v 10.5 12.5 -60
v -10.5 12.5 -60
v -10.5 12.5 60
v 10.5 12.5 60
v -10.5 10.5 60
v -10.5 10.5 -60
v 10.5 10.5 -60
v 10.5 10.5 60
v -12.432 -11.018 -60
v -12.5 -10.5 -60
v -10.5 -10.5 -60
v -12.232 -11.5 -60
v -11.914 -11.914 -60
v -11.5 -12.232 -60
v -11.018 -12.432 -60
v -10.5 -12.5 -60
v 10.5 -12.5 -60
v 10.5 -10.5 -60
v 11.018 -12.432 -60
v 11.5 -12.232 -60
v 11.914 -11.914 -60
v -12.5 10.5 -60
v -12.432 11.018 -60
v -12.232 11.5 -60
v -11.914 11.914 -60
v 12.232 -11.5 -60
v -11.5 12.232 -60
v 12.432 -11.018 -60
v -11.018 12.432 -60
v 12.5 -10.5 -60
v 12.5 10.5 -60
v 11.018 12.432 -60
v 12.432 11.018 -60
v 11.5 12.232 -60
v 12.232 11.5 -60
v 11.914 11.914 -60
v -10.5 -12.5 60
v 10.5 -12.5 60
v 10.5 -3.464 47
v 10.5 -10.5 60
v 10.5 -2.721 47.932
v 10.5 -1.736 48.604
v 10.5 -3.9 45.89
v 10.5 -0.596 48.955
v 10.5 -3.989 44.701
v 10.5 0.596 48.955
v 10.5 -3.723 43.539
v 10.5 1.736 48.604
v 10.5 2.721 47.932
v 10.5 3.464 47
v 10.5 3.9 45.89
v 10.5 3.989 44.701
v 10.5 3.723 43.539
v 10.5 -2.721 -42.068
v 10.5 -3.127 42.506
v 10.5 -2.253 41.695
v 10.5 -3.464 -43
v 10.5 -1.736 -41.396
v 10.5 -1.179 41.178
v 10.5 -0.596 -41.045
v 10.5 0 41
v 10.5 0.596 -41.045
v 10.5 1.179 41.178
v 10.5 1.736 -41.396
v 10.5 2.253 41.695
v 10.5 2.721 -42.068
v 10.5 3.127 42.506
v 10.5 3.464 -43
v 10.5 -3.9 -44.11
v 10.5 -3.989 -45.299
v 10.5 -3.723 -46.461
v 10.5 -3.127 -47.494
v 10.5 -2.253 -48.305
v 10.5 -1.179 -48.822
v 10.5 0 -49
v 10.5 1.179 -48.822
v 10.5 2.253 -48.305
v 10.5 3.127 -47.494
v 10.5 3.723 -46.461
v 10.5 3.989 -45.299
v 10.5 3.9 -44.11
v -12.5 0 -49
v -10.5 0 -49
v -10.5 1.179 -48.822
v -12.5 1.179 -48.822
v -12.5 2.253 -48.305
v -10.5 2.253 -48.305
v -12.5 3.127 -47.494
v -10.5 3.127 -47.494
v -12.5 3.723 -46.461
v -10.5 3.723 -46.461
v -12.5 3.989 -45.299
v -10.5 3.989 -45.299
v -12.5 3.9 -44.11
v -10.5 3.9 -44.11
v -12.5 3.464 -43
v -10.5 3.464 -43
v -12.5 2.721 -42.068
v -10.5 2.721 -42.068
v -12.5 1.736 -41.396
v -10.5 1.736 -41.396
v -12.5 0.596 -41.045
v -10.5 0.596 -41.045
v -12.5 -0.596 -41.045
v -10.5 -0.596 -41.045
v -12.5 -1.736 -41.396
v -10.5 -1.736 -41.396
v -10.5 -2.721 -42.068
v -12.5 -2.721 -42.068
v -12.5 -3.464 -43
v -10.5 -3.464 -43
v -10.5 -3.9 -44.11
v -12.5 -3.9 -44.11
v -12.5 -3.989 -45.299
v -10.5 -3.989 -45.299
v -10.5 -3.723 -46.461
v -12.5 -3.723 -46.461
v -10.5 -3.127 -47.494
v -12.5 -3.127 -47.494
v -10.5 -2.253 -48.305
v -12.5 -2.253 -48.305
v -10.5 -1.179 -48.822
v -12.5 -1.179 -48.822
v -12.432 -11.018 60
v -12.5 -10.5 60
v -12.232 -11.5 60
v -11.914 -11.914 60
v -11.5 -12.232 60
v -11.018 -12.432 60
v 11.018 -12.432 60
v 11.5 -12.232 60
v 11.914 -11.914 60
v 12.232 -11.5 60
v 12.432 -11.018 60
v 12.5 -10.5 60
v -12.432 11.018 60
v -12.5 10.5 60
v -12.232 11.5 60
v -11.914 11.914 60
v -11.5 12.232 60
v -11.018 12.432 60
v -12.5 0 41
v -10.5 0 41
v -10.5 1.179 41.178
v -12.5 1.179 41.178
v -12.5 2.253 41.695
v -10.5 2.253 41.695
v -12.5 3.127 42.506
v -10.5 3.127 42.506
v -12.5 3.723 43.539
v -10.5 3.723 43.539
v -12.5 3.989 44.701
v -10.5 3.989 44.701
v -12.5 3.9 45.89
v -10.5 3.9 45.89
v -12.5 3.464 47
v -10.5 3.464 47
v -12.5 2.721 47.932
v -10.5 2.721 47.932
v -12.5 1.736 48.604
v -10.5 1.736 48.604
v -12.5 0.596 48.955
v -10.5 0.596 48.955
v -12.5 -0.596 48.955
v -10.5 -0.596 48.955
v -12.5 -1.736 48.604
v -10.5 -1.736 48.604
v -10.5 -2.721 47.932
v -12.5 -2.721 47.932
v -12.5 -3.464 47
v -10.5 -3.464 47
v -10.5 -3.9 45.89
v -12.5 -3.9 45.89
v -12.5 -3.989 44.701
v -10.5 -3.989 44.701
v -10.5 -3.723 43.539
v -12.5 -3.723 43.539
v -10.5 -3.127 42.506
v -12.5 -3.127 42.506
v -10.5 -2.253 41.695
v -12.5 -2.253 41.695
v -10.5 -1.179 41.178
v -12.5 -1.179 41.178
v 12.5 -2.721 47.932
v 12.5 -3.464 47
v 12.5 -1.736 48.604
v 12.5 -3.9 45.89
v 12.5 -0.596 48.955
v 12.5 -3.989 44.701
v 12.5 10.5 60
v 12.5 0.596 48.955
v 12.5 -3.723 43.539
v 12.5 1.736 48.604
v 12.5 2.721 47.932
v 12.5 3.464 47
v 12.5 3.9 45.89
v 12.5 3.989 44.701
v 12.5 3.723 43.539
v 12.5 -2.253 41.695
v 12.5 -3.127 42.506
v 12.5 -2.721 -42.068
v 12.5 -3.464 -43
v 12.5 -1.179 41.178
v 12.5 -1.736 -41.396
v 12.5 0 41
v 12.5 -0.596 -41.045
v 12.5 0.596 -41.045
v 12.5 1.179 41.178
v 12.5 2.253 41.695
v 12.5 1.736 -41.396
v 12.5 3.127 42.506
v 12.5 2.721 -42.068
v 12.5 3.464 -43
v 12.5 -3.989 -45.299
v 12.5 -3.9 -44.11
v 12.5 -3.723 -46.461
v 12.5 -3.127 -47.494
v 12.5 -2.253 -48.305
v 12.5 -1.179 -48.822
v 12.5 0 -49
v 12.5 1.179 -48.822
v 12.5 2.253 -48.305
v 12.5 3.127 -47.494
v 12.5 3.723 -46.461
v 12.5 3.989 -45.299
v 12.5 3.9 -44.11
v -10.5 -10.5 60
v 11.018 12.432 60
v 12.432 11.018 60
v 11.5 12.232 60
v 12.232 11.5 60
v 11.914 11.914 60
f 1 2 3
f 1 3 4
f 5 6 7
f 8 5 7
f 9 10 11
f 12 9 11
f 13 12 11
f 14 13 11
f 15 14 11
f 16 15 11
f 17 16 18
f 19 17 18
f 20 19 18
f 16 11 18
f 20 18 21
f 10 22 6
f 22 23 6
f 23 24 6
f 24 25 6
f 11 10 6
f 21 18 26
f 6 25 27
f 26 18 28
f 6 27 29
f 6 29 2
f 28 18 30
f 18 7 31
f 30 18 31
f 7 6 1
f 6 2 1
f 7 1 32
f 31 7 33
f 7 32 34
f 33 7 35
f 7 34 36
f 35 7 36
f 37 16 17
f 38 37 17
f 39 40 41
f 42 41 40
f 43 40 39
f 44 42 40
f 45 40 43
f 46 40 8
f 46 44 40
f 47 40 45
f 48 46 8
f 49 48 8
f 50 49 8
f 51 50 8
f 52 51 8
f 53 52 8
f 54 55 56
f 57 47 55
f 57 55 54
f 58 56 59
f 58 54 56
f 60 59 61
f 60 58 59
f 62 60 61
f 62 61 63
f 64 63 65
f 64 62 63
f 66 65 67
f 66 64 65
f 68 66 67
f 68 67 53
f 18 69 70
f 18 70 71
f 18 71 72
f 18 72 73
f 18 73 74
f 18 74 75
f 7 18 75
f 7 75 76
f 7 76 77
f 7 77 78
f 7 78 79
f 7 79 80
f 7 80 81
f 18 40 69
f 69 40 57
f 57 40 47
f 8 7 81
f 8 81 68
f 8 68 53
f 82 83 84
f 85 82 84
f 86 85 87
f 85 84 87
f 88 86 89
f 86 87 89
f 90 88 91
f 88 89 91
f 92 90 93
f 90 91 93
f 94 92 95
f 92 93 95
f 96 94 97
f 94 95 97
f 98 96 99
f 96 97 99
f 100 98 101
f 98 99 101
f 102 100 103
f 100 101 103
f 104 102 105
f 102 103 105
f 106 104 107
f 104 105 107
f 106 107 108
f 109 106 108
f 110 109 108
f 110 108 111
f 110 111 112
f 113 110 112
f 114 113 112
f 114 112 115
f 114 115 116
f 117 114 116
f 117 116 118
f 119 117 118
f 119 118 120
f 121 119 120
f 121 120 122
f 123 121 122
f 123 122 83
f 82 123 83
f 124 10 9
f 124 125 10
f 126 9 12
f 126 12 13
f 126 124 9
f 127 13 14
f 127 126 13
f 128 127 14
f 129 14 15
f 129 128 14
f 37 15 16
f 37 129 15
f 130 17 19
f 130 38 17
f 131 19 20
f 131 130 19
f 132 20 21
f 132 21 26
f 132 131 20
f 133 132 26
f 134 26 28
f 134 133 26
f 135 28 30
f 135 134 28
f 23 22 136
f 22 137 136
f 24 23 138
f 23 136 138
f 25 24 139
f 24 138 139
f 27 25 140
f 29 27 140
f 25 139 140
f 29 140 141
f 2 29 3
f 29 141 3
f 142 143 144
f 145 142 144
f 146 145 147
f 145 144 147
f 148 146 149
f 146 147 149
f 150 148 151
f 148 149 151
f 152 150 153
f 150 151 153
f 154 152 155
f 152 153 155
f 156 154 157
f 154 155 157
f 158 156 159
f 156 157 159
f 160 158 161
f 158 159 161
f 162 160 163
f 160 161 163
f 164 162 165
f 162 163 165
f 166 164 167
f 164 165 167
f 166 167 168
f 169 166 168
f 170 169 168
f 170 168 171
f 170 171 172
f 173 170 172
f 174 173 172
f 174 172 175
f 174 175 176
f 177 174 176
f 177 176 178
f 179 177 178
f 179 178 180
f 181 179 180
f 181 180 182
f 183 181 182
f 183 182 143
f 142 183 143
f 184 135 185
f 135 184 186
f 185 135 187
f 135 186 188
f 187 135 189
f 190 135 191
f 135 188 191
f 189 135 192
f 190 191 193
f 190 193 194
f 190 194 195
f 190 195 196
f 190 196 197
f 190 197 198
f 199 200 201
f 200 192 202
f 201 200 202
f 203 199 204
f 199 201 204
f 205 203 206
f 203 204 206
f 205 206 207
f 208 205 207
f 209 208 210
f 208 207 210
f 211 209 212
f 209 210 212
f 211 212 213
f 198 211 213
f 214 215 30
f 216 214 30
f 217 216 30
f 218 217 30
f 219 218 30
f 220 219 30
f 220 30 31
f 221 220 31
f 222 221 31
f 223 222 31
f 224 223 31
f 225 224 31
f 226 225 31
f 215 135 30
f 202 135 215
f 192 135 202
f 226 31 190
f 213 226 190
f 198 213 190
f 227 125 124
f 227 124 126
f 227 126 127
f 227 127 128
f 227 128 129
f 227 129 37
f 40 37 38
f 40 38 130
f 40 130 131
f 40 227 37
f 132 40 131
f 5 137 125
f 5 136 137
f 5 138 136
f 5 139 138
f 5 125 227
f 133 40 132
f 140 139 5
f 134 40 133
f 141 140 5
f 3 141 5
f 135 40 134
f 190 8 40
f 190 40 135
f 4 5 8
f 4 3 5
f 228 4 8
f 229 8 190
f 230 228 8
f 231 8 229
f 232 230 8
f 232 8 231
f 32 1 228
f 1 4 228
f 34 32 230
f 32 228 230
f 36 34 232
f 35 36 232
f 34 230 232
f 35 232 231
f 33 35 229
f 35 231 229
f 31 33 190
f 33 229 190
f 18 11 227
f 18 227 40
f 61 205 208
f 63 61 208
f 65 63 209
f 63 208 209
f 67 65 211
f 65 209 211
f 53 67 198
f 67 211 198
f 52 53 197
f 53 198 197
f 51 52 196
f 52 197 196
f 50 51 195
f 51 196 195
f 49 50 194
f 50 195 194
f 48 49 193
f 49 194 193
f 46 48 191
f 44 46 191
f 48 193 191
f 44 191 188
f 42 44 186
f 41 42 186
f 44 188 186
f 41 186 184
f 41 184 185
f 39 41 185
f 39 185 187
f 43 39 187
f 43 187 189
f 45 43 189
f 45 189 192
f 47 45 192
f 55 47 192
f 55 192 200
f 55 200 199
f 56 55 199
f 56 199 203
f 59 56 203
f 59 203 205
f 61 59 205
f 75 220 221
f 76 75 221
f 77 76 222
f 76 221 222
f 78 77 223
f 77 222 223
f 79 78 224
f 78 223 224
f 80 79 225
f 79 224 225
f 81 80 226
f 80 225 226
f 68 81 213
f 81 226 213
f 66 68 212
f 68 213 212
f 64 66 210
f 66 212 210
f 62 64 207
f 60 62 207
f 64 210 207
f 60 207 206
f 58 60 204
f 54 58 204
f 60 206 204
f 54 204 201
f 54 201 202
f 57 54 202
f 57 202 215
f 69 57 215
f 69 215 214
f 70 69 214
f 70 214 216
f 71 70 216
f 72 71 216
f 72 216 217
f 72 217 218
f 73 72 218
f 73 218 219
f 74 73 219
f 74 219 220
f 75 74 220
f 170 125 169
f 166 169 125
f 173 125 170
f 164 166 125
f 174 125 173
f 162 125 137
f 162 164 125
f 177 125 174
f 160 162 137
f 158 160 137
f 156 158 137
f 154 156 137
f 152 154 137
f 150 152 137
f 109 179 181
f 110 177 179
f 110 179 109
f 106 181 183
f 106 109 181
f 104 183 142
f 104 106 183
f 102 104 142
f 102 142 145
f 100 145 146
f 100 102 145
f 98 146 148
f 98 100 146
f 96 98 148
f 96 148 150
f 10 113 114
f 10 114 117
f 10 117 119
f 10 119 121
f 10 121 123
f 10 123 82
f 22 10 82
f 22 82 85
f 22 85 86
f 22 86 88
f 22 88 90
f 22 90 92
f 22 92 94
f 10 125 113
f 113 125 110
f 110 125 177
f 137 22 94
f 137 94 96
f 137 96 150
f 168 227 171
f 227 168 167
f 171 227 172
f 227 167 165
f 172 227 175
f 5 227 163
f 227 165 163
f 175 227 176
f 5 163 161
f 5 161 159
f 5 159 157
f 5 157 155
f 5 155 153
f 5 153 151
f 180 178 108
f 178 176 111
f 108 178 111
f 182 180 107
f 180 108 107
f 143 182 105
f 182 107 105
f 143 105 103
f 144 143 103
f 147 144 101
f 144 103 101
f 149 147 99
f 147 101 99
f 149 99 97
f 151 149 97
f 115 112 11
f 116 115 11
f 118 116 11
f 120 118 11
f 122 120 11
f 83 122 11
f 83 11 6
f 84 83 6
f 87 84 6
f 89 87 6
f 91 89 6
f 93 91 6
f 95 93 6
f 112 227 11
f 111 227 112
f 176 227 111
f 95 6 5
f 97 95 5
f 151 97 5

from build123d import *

# Parameters (mm, degrees)
EXTRUDE_THIN1_DEPTH      = 60
EXTRUDE_THIN1_DEPTH_BACK = 60
SKETCH1_W                = 25
SKETCH1_H                = 25
SKETCH1_W_2              = 21
SKETCH1_H_2              = 21
FILLET1_R                = 2
SKETCH2_R                = 4
CUT_EXTRUDE1_DEPTH       = 67.191011474


with BuildPart() as part:
    # Sketch1 → Extrude-Thin1 (new, two sides: drawn at the far end of the back side and taken through both)
    with BuildSketch(Plane.XY.offset(-EXTRUDE_THIN1_DEPTH_BACK)):
        Rectangle(SKETCH1_W, SKETCH1_H)
        Rectangle(SKETCH1_W_2, SKETCH1_H_2, mode=Mode.SUBTRACT)
    extrude(amount=EXTRUDE_THIN1_DEPTH + EXTRUDE_THIN1_DEPTH_BACK)

    # Fillet1
    fillet1_edges = [part.edges().sort_by_distance(p)[0] for p in [
        (12.5, -12.5, 0),
        (-12.5, -12.5, 0),
        (-12.5, 12.5, 0),
        (12.5, 12.5, 0),
    ]]
    fillet(fillet1_edges, radius=FILLET1_R)

    # Sketch2 → Cut-Extrude1 (cut, through all)
    with BuildSketch(Plane(origin=(12.5, 0, 0), x_dir=(0, 0, -1), z_dir=(1, 0, 0))):
        with Locations((-45, 0)):
            Circle(SKETCH2_R)
        with Locations((45, 0)):
            Circle(SKETCH2_R)
    extrude(amount=-CUT_EXTRUDE1_DEPTH, mode=Mode.SUBTRACT)


solid = part.part
